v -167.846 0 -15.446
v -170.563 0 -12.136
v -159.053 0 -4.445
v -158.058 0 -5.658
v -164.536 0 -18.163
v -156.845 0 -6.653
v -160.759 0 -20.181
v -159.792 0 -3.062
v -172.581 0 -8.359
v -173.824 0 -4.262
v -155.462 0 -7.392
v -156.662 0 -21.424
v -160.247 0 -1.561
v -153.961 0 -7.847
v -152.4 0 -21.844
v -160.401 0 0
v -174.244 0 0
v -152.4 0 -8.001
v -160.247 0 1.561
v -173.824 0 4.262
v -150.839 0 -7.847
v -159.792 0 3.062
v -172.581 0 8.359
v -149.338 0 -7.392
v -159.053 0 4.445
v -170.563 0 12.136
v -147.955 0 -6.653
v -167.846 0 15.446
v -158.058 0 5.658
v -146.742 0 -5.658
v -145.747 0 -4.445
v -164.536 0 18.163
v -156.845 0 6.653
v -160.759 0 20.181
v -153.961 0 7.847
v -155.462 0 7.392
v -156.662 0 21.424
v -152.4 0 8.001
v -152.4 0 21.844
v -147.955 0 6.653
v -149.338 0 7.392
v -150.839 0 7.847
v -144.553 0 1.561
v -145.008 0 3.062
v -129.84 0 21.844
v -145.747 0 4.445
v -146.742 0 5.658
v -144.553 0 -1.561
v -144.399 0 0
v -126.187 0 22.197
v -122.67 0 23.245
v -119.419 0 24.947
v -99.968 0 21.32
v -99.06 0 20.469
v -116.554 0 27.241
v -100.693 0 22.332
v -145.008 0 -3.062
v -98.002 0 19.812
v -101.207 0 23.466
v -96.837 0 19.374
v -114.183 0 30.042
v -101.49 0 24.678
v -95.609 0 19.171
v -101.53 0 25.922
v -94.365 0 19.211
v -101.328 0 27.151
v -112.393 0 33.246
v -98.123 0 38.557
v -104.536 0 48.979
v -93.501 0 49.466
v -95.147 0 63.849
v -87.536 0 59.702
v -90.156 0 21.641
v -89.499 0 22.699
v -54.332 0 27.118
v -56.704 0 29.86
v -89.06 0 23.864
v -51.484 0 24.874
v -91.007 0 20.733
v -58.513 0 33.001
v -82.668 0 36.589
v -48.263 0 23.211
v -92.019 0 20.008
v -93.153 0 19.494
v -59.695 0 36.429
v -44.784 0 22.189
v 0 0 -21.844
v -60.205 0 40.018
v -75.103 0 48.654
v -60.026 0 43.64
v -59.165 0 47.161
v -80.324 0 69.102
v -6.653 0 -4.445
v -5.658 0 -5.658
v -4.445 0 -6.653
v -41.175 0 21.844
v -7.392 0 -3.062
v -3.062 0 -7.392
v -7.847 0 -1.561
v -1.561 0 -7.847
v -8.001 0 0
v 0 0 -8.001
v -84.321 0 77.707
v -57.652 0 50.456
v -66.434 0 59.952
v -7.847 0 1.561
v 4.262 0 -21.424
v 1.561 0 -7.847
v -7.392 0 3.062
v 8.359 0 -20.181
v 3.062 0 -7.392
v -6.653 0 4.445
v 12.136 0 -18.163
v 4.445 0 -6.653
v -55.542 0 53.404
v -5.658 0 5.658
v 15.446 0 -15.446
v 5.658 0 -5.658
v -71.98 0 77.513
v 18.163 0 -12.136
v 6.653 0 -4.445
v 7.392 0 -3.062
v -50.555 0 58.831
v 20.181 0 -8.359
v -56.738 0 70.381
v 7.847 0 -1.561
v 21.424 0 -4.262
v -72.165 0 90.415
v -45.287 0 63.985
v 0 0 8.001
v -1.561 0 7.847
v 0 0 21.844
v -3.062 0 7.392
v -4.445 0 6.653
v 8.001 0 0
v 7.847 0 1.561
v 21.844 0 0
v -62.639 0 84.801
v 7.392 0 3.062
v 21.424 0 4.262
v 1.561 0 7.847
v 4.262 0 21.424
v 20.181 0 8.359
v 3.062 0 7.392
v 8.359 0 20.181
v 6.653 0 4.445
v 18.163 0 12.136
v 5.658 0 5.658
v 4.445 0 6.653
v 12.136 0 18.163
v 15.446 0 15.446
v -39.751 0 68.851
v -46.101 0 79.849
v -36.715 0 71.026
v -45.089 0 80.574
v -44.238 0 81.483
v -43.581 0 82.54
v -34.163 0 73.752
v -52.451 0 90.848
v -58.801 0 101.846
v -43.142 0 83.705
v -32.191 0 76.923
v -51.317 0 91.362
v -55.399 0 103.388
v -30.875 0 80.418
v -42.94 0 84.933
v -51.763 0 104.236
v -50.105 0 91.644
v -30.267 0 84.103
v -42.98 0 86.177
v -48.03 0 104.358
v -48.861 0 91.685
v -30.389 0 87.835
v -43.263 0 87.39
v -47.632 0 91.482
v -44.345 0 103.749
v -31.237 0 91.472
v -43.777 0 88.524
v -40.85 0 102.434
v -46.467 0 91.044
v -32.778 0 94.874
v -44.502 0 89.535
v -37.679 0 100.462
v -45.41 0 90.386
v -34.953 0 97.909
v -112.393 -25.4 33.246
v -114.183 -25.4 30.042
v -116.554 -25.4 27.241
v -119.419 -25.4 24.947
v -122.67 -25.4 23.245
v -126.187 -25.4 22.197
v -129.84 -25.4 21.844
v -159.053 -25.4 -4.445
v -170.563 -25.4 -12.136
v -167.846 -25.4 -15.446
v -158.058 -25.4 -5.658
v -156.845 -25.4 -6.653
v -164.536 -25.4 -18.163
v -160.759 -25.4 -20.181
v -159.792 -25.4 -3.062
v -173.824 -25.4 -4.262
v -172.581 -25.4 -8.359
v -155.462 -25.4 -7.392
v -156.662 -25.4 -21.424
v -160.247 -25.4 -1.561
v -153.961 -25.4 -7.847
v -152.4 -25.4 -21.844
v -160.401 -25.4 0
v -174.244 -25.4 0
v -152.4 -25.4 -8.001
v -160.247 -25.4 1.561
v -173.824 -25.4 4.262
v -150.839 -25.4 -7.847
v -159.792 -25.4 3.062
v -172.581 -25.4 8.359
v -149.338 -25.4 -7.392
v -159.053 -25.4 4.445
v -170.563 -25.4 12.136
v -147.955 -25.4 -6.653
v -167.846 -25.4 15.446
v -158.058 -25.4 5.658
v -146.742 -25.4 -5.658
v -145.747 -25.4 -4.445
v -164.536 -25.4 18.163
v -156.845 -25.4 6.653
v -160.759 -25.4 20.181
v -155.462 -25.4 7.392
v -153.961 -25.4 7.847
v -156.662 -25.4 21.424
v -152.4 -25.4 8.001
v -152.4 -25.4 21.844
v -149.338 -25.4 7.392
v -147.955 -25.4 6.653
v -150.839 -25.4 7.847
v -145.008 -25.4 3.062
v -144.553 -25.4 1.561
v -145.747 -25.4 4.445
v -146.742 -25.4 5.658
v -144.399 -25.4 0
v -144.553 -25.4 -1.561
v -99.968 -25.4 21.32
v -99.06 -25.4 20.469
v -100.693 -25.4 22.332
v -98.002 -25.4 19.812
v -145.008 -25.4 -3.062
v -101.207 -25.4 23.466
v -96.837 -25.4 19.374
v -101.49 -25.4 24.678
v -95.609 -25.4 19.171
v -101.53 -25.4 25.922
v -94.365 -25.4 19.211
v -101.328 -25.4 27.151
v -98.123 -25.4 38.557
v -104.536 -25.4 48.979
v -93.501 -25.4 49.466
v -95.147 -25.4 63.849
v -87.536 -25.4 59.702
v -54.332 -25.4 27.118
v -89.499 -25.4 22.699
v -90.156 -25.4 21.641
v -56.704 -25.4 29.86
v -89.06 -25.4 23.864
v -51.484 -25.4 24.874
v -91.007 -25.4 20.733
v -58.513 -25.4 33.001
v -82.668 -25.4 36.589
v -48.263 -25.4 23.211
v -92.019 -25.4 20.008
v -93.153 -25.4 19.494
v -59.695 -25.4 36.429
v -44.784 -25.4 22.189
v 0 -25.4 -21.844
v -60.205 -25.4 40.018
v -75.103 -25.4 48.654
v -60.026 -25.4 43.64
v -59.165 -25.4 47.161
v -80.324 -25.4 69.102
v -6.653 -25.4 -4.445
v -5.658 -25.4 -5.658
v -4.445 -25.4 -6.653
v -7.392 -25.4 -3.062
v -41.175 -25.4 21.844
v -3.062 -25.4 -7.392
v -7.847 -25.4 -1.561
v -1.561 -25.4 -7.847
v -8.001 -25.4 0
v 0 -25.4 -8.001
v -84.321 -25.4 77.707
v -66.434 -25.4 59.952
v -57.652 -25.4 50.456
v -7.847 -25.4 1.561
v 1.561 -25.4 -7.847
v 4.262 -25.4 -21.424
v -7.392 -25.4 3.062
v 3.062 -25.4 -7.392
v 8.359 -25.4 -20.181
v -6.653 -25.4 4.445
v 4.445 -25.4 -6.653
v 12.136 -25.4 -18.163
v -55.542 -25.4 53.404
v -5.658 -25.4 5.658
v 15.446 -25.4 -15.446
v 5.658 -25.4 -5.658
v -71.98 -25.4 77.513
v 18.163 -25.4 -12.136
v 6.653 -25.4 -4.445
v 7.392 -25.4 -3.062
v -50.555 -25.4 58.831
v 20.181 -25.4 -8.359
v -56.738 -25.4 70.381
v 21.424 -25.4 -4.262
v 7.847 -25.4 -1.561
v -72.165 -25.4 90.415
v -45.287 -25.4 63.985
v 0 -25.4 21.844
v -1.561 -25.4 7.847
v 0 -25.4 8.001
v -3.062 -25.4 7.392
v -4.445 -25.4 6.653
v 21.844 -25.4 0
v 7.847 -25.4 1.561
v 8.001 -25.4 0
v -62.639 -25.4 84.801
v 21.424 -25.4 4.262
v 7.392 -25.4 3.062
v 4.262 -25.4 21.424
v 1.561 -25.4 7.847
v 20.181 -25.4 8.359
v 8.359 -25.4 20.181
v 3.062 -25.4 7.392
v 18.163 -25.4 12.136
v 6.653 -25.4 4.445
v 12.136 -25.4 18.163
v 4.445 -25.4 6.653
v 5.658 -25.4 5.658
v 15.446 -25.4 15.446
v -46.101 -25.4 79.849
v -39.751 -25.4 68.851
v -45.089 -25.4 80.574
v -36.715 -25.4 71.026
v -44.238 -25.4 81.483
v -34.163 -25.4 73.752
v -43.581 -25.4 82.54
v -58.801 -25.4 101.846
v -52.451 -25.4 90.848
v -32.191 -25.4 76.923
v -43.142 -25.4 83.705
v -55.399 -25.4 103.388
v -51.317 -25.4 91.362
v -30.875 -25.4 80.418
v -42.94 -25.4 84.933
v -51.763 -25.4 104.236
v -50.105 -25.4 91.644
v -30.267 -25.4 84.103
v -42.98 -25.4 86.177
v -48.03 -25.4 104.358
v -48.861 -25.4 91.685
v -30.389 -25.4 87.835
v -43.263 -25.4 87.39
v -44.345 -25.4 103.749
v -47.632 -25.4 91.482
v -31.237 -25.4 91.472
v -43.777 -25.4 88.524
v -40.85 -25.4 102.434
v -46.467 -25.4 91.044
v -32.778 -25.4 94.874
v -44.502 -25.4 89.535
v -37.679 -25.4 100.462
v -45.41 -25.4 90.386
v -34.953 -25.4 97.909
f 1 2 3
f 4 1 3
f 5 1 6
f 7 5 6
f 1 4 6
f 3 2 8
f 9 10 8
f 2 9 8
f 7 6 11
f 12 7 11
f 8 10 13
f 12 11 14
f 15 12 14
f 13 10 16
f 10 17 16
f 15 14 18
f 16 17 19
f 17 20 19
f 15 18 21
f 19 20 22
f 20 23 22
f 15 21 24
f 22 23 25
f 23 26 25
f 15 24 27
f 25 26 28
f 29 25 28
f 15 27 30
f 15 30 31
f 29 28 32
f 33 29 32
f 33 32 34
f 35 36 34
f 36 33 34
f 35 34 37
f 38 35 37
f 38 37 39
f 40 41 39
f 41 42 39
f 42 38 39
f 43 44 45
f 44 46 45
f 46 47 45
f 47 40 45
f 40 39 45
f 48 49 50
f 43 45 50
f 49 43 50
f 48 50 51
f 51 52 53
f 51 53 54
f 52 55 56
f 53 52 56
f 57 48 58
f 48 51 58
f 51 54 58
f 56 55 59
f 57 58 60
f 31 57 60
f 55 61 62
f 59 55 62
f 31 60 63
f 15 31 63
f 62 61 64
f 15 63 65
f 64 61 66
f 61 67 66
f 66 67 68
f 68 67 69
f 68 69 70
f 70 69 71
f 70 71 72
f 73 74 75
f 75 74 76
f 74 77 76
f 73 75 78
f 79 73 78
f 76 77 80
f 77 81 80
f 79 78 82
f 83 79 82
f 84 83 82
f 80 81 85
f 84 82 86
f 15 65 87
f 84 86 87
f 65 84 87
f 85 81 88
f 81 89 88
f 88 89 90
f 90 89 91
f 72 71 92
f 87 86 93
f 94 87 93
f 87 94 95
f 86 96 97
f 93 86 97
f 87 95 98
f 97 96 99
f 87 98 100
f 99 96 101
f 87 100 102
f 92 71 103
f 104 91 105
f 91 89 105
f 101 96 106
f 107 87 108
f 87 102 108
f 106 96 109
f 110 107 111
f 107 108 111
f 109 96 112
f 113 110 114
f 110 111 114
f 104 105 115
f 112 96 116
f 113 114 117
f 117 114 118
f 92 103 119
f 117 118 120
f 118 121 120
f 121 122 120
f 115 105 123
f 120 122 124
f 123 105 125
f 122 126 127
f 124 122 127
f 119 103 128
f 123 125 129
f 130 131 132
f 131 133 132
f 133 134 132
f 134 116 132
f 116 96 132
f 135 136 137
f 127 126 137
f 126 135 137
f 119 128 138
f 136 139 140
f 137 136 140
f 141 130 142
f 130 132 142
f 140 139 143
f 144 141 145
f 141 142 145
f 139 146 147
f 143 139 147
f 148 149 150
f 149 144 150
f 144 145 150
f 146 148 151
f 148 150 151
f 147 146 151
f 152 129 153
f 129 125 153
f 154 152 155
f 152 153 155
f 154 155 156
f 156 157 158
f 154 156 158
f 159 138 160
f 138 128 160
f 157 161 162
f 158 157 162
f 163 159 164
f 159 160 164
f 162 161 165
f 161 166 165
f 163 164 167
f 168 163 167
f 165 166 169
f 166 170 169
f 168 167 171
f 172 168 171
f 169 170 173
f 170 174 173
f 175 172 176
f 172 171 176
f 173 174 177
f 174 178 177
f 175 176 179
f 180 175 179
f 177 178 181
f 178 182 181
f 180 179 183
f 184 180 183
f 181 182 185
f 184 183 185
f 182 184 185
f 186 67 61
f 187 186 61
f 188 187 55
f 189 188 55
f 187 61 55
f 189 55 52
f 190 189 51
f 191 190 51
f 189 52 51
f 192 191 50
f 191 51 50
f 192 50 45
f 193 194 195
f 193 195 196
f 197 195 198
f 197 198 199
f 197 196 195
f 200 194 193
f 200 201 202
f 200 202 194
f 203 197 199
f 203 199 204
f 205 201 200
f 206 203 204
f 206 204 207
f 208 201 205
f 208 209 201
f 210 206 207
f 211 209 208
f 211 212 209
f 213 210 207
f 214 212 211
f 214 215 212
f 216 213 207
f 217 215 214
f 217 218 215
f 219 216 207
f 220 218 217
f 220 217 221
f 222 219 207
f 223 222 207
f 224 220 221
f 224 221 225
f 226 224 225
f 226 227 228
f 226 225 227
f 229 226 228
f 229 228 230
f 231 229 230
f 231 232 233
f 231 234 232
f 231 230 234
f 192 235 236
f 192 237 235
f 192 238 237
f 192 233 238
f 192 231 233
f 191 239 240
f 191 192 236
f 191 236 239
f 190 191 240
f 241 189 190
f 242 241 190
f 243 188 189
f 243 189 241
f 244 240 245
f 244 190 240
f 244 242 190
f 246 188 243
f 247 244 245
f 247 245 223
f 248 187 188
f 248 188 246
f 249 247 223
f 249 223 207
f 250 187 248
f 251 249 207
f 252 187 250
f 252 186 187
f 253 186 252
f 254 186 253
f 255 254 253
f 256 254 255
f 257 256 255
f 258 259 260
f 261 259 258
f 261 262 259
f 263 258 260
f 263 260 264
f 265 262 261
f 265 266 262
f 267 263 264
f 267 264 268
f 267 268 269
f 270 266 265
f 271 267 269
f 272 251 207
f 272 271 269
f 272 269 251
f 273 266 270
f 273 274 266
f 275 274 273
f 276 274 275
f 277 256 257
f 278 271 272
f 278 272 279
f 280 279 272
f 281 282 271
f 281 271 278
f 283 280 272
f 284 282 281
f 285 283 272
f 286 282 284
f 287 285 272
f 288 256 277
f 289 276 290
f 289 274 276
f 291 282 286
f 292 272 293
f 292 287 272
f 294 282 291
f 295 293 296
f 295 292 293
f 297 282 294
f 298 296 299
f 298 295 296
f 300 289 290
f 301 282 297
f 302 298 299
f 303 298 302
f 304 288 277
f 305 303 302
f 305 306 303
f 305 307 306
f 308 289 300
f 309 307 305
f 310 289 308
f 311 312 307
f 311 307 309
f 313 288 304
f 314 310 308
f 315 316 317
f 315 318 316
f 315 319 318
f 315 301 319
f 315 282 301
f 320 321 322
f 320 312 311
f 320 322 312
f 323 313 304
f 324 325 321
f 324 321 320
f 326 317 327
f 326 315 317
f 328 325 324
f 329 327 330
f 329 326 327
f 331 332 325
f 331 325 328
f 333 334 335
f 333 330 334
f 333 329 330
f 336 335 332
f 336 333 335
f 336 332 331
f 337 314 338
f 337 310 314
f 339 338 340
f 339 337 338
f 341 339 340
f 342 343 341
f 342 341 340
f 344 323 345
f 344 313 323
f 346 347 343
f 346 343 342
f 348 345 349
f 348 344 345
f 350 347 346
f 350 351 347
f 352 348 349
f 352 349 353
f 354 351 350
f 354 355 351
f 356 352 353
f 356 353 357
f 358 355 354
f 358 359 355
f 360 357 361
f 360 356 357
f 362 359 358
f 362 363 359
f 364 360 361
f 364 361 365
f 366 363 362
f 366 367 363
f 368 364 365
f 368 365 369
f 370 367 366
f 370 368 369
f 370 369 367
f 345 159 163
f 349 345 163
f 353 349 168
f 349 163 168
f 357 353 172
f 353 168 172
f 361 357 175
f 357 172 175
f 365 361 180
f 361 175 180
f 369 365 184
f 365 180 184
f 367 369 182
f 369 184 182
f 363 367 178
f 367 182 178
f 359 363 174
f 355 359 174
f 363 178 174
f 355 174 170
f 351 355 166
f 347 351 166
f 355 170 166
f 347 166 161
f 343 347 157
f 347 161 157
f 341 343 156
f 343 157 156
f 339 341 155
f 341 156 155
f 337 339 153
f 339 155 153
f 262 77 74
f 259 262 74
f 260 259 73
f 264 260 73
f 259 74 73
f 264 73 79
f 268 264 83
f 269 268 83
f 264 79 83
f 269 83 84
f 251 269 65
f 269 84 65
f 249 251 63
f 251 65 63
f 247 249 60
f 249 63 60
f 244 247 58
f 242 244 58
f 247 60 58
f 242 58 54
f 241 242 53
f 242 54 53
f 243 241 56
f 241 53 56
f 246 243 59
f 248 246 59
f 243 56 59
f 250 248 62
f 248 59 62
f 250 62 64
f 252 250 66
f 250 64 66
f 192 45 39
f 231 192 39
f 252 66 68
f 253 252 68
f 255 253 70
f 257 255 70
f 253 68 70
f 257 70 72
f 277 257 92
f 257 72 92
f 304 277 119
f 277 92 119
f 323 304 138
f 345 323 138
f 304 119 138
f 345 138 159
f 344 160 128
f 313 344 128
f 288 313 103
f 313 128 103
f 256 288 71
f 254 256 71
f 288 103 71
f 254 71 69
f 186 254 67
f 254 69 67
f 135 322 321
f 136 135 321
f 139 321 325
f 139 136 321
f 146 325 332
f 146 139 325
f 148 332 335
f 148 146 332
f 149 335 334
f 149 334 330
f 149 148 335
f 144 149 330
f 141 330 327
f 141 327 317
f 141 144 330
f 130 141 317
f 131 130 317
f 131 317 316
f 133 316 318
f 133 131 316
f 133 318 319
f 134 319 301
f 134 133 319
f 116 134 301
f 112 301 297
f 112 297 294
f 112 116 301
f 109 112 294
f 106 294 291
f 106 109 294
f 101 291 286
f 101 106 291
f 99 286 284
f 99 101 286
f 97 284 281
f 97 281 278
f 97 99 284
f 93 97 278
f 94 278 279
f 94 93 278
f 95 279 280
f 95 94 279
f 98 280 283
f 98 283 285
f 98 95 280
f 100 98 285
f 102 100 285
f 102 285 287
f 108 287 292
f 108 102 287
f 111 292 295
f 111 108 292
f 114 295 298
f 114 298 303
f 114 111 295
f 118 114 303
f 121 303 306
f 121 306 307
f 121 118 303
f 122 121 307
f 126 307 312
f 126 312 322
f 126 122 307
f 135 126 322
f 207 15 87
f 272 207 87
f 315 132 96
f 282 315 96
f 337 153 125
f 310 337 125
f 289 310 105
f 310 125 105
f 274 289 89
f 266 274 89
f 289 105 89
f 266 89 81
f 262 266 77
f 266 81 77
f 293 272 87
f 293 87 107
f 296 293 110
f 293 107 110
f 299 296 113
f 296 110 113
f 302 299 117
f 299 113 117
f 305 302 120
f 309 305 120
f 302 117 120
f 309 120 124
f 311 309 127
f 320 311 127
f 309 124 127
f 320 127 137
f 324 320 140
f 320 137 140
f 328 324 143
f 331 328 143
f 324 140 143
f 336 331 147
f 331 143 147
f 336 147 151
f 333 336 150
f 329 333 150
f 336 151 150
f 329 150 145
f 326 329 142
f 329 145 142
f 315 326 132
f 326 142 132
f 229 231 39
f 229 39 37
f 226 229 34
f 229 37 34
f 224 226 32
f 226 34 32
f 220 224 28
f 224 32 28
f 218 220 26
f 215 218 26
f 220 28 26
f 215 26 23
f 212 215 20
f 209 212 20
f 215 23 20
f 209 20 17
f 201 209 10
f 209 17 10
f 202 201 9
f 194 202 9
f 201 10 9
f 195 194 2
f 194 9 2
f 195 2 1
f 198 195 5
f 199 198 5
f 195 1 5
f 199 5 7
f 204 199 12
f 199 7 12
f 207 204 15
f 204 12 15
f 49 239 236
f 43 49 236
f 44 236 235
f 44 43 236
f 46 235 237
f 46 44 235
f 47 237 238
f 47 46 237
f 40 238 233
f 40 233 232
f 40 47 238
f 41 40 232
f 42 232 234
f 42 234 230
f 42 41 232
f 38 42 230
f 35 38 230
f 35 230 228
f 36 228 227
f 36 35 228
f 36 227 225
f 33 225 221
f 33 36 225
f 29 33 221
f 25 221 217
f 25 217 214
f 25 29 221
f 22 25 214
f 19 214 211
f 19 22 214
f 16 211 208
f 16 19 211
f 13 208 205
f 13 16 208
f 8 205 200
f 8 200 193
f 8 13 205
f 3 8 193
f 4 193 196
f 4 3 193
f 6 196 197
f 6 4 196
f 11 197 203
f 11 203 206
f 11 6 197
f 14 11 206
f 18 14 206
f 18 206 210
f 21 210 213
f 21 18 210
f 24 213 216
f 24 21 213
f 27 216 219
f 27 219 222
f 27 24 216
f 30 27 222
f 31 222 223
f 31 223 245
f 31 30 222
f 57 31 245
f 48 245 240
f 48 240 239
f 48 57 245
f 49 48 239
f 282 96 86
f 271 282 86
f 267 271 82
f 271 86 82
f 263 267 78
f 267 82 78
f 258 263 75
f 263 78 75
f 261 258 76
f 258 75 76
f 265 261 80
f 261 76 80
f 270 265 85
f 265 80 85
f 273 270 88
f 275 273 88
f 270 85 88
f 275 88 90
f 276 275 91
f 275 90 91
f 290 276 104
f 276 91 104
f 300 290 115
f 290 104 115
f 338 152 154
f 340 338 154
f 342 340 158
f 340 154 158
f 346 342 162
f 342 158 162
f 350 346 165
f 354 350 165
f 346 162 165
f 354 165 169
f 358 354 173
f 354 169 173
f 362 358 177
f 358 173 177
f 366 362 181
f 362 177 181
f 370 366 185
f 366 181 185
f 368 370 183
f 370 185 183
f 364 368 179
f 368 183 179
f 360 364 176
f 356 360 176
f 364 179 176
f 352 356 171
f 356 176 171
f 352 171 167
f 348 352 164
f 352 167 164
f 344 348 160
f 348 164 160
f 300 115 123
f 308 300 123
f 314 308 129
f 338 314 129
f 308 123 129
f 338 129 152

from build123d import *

# Parameters (mm, degrees)
F0_R     = 8.001
F1_DEPTH = 25.4


with BuildPart() as f1:
    # F0 (on Front) → F1 (new body)
    with BuildSketch(Plane.XZ):
        with BuildLine():
            Line((-76.2, -21.844), (0, -21.844))
            ThreePointArc((0, -21.844), (21.844, 0), (0, 21.844))
            Line((0, 21.844), (-41.175205, 21.844))
            ThreePointArc((-41.175205, 21.844), (-58.513323, 33.001463), (-55.541791, 53.404144))
            ThreePointArc((-55.541791, 53.404144), (-47.955418, 61.443356), (-39.751, 68.850752))
            ThreePointArc((-39.751, 68.850752), (-32.778216, 94.873536), (-58.801, 101.84632))
            ThreePointArc((-58.801, 101.84632), (-89.907606, 70.913561), (-112.392814, 33.245646))
            ThreePointArc((-112.392814, 33.245646), (-119.418861, 24.947156), (-129.840026, 21.844))
            Line((-129.840026, 21.844), (-152.4, 21.844))
            ThreePointArc((-152.4, 21.844), (-174.244, 0), (-152.4, -21.844))
            Line((-152.4, -21.844), (-76.2, -21.844))
        make_face()
        with Locations((-152.4, 0)):
            Circle(F0_R, mode=Mode.SUBTRACT)
        Circle(F0_R, mode=Mode.SUBTRACT)
        with BuildLine():
            ThreePointArc((-52.451, 90.847797), (-43.776739, 88.523536), (-46.101, 79.849274))
            ThreePointArc((-46.101, 79.849274), (-70.902285, 54.405237), (-89.060293, 23.863634))
            ThreePointArc((-89.060293, 23.863634), (-96.837423, 19.373506), (-101.327551, 27.150635))
            ThreePointArc((-101.327551, 27.150635), (-84.079326, 64.516336), (-52.451, 90.847797))
        make_face(mode=Mode.SUBTRACT)
    extrude(amount=F1_DEPTH)


solid = f1.part
